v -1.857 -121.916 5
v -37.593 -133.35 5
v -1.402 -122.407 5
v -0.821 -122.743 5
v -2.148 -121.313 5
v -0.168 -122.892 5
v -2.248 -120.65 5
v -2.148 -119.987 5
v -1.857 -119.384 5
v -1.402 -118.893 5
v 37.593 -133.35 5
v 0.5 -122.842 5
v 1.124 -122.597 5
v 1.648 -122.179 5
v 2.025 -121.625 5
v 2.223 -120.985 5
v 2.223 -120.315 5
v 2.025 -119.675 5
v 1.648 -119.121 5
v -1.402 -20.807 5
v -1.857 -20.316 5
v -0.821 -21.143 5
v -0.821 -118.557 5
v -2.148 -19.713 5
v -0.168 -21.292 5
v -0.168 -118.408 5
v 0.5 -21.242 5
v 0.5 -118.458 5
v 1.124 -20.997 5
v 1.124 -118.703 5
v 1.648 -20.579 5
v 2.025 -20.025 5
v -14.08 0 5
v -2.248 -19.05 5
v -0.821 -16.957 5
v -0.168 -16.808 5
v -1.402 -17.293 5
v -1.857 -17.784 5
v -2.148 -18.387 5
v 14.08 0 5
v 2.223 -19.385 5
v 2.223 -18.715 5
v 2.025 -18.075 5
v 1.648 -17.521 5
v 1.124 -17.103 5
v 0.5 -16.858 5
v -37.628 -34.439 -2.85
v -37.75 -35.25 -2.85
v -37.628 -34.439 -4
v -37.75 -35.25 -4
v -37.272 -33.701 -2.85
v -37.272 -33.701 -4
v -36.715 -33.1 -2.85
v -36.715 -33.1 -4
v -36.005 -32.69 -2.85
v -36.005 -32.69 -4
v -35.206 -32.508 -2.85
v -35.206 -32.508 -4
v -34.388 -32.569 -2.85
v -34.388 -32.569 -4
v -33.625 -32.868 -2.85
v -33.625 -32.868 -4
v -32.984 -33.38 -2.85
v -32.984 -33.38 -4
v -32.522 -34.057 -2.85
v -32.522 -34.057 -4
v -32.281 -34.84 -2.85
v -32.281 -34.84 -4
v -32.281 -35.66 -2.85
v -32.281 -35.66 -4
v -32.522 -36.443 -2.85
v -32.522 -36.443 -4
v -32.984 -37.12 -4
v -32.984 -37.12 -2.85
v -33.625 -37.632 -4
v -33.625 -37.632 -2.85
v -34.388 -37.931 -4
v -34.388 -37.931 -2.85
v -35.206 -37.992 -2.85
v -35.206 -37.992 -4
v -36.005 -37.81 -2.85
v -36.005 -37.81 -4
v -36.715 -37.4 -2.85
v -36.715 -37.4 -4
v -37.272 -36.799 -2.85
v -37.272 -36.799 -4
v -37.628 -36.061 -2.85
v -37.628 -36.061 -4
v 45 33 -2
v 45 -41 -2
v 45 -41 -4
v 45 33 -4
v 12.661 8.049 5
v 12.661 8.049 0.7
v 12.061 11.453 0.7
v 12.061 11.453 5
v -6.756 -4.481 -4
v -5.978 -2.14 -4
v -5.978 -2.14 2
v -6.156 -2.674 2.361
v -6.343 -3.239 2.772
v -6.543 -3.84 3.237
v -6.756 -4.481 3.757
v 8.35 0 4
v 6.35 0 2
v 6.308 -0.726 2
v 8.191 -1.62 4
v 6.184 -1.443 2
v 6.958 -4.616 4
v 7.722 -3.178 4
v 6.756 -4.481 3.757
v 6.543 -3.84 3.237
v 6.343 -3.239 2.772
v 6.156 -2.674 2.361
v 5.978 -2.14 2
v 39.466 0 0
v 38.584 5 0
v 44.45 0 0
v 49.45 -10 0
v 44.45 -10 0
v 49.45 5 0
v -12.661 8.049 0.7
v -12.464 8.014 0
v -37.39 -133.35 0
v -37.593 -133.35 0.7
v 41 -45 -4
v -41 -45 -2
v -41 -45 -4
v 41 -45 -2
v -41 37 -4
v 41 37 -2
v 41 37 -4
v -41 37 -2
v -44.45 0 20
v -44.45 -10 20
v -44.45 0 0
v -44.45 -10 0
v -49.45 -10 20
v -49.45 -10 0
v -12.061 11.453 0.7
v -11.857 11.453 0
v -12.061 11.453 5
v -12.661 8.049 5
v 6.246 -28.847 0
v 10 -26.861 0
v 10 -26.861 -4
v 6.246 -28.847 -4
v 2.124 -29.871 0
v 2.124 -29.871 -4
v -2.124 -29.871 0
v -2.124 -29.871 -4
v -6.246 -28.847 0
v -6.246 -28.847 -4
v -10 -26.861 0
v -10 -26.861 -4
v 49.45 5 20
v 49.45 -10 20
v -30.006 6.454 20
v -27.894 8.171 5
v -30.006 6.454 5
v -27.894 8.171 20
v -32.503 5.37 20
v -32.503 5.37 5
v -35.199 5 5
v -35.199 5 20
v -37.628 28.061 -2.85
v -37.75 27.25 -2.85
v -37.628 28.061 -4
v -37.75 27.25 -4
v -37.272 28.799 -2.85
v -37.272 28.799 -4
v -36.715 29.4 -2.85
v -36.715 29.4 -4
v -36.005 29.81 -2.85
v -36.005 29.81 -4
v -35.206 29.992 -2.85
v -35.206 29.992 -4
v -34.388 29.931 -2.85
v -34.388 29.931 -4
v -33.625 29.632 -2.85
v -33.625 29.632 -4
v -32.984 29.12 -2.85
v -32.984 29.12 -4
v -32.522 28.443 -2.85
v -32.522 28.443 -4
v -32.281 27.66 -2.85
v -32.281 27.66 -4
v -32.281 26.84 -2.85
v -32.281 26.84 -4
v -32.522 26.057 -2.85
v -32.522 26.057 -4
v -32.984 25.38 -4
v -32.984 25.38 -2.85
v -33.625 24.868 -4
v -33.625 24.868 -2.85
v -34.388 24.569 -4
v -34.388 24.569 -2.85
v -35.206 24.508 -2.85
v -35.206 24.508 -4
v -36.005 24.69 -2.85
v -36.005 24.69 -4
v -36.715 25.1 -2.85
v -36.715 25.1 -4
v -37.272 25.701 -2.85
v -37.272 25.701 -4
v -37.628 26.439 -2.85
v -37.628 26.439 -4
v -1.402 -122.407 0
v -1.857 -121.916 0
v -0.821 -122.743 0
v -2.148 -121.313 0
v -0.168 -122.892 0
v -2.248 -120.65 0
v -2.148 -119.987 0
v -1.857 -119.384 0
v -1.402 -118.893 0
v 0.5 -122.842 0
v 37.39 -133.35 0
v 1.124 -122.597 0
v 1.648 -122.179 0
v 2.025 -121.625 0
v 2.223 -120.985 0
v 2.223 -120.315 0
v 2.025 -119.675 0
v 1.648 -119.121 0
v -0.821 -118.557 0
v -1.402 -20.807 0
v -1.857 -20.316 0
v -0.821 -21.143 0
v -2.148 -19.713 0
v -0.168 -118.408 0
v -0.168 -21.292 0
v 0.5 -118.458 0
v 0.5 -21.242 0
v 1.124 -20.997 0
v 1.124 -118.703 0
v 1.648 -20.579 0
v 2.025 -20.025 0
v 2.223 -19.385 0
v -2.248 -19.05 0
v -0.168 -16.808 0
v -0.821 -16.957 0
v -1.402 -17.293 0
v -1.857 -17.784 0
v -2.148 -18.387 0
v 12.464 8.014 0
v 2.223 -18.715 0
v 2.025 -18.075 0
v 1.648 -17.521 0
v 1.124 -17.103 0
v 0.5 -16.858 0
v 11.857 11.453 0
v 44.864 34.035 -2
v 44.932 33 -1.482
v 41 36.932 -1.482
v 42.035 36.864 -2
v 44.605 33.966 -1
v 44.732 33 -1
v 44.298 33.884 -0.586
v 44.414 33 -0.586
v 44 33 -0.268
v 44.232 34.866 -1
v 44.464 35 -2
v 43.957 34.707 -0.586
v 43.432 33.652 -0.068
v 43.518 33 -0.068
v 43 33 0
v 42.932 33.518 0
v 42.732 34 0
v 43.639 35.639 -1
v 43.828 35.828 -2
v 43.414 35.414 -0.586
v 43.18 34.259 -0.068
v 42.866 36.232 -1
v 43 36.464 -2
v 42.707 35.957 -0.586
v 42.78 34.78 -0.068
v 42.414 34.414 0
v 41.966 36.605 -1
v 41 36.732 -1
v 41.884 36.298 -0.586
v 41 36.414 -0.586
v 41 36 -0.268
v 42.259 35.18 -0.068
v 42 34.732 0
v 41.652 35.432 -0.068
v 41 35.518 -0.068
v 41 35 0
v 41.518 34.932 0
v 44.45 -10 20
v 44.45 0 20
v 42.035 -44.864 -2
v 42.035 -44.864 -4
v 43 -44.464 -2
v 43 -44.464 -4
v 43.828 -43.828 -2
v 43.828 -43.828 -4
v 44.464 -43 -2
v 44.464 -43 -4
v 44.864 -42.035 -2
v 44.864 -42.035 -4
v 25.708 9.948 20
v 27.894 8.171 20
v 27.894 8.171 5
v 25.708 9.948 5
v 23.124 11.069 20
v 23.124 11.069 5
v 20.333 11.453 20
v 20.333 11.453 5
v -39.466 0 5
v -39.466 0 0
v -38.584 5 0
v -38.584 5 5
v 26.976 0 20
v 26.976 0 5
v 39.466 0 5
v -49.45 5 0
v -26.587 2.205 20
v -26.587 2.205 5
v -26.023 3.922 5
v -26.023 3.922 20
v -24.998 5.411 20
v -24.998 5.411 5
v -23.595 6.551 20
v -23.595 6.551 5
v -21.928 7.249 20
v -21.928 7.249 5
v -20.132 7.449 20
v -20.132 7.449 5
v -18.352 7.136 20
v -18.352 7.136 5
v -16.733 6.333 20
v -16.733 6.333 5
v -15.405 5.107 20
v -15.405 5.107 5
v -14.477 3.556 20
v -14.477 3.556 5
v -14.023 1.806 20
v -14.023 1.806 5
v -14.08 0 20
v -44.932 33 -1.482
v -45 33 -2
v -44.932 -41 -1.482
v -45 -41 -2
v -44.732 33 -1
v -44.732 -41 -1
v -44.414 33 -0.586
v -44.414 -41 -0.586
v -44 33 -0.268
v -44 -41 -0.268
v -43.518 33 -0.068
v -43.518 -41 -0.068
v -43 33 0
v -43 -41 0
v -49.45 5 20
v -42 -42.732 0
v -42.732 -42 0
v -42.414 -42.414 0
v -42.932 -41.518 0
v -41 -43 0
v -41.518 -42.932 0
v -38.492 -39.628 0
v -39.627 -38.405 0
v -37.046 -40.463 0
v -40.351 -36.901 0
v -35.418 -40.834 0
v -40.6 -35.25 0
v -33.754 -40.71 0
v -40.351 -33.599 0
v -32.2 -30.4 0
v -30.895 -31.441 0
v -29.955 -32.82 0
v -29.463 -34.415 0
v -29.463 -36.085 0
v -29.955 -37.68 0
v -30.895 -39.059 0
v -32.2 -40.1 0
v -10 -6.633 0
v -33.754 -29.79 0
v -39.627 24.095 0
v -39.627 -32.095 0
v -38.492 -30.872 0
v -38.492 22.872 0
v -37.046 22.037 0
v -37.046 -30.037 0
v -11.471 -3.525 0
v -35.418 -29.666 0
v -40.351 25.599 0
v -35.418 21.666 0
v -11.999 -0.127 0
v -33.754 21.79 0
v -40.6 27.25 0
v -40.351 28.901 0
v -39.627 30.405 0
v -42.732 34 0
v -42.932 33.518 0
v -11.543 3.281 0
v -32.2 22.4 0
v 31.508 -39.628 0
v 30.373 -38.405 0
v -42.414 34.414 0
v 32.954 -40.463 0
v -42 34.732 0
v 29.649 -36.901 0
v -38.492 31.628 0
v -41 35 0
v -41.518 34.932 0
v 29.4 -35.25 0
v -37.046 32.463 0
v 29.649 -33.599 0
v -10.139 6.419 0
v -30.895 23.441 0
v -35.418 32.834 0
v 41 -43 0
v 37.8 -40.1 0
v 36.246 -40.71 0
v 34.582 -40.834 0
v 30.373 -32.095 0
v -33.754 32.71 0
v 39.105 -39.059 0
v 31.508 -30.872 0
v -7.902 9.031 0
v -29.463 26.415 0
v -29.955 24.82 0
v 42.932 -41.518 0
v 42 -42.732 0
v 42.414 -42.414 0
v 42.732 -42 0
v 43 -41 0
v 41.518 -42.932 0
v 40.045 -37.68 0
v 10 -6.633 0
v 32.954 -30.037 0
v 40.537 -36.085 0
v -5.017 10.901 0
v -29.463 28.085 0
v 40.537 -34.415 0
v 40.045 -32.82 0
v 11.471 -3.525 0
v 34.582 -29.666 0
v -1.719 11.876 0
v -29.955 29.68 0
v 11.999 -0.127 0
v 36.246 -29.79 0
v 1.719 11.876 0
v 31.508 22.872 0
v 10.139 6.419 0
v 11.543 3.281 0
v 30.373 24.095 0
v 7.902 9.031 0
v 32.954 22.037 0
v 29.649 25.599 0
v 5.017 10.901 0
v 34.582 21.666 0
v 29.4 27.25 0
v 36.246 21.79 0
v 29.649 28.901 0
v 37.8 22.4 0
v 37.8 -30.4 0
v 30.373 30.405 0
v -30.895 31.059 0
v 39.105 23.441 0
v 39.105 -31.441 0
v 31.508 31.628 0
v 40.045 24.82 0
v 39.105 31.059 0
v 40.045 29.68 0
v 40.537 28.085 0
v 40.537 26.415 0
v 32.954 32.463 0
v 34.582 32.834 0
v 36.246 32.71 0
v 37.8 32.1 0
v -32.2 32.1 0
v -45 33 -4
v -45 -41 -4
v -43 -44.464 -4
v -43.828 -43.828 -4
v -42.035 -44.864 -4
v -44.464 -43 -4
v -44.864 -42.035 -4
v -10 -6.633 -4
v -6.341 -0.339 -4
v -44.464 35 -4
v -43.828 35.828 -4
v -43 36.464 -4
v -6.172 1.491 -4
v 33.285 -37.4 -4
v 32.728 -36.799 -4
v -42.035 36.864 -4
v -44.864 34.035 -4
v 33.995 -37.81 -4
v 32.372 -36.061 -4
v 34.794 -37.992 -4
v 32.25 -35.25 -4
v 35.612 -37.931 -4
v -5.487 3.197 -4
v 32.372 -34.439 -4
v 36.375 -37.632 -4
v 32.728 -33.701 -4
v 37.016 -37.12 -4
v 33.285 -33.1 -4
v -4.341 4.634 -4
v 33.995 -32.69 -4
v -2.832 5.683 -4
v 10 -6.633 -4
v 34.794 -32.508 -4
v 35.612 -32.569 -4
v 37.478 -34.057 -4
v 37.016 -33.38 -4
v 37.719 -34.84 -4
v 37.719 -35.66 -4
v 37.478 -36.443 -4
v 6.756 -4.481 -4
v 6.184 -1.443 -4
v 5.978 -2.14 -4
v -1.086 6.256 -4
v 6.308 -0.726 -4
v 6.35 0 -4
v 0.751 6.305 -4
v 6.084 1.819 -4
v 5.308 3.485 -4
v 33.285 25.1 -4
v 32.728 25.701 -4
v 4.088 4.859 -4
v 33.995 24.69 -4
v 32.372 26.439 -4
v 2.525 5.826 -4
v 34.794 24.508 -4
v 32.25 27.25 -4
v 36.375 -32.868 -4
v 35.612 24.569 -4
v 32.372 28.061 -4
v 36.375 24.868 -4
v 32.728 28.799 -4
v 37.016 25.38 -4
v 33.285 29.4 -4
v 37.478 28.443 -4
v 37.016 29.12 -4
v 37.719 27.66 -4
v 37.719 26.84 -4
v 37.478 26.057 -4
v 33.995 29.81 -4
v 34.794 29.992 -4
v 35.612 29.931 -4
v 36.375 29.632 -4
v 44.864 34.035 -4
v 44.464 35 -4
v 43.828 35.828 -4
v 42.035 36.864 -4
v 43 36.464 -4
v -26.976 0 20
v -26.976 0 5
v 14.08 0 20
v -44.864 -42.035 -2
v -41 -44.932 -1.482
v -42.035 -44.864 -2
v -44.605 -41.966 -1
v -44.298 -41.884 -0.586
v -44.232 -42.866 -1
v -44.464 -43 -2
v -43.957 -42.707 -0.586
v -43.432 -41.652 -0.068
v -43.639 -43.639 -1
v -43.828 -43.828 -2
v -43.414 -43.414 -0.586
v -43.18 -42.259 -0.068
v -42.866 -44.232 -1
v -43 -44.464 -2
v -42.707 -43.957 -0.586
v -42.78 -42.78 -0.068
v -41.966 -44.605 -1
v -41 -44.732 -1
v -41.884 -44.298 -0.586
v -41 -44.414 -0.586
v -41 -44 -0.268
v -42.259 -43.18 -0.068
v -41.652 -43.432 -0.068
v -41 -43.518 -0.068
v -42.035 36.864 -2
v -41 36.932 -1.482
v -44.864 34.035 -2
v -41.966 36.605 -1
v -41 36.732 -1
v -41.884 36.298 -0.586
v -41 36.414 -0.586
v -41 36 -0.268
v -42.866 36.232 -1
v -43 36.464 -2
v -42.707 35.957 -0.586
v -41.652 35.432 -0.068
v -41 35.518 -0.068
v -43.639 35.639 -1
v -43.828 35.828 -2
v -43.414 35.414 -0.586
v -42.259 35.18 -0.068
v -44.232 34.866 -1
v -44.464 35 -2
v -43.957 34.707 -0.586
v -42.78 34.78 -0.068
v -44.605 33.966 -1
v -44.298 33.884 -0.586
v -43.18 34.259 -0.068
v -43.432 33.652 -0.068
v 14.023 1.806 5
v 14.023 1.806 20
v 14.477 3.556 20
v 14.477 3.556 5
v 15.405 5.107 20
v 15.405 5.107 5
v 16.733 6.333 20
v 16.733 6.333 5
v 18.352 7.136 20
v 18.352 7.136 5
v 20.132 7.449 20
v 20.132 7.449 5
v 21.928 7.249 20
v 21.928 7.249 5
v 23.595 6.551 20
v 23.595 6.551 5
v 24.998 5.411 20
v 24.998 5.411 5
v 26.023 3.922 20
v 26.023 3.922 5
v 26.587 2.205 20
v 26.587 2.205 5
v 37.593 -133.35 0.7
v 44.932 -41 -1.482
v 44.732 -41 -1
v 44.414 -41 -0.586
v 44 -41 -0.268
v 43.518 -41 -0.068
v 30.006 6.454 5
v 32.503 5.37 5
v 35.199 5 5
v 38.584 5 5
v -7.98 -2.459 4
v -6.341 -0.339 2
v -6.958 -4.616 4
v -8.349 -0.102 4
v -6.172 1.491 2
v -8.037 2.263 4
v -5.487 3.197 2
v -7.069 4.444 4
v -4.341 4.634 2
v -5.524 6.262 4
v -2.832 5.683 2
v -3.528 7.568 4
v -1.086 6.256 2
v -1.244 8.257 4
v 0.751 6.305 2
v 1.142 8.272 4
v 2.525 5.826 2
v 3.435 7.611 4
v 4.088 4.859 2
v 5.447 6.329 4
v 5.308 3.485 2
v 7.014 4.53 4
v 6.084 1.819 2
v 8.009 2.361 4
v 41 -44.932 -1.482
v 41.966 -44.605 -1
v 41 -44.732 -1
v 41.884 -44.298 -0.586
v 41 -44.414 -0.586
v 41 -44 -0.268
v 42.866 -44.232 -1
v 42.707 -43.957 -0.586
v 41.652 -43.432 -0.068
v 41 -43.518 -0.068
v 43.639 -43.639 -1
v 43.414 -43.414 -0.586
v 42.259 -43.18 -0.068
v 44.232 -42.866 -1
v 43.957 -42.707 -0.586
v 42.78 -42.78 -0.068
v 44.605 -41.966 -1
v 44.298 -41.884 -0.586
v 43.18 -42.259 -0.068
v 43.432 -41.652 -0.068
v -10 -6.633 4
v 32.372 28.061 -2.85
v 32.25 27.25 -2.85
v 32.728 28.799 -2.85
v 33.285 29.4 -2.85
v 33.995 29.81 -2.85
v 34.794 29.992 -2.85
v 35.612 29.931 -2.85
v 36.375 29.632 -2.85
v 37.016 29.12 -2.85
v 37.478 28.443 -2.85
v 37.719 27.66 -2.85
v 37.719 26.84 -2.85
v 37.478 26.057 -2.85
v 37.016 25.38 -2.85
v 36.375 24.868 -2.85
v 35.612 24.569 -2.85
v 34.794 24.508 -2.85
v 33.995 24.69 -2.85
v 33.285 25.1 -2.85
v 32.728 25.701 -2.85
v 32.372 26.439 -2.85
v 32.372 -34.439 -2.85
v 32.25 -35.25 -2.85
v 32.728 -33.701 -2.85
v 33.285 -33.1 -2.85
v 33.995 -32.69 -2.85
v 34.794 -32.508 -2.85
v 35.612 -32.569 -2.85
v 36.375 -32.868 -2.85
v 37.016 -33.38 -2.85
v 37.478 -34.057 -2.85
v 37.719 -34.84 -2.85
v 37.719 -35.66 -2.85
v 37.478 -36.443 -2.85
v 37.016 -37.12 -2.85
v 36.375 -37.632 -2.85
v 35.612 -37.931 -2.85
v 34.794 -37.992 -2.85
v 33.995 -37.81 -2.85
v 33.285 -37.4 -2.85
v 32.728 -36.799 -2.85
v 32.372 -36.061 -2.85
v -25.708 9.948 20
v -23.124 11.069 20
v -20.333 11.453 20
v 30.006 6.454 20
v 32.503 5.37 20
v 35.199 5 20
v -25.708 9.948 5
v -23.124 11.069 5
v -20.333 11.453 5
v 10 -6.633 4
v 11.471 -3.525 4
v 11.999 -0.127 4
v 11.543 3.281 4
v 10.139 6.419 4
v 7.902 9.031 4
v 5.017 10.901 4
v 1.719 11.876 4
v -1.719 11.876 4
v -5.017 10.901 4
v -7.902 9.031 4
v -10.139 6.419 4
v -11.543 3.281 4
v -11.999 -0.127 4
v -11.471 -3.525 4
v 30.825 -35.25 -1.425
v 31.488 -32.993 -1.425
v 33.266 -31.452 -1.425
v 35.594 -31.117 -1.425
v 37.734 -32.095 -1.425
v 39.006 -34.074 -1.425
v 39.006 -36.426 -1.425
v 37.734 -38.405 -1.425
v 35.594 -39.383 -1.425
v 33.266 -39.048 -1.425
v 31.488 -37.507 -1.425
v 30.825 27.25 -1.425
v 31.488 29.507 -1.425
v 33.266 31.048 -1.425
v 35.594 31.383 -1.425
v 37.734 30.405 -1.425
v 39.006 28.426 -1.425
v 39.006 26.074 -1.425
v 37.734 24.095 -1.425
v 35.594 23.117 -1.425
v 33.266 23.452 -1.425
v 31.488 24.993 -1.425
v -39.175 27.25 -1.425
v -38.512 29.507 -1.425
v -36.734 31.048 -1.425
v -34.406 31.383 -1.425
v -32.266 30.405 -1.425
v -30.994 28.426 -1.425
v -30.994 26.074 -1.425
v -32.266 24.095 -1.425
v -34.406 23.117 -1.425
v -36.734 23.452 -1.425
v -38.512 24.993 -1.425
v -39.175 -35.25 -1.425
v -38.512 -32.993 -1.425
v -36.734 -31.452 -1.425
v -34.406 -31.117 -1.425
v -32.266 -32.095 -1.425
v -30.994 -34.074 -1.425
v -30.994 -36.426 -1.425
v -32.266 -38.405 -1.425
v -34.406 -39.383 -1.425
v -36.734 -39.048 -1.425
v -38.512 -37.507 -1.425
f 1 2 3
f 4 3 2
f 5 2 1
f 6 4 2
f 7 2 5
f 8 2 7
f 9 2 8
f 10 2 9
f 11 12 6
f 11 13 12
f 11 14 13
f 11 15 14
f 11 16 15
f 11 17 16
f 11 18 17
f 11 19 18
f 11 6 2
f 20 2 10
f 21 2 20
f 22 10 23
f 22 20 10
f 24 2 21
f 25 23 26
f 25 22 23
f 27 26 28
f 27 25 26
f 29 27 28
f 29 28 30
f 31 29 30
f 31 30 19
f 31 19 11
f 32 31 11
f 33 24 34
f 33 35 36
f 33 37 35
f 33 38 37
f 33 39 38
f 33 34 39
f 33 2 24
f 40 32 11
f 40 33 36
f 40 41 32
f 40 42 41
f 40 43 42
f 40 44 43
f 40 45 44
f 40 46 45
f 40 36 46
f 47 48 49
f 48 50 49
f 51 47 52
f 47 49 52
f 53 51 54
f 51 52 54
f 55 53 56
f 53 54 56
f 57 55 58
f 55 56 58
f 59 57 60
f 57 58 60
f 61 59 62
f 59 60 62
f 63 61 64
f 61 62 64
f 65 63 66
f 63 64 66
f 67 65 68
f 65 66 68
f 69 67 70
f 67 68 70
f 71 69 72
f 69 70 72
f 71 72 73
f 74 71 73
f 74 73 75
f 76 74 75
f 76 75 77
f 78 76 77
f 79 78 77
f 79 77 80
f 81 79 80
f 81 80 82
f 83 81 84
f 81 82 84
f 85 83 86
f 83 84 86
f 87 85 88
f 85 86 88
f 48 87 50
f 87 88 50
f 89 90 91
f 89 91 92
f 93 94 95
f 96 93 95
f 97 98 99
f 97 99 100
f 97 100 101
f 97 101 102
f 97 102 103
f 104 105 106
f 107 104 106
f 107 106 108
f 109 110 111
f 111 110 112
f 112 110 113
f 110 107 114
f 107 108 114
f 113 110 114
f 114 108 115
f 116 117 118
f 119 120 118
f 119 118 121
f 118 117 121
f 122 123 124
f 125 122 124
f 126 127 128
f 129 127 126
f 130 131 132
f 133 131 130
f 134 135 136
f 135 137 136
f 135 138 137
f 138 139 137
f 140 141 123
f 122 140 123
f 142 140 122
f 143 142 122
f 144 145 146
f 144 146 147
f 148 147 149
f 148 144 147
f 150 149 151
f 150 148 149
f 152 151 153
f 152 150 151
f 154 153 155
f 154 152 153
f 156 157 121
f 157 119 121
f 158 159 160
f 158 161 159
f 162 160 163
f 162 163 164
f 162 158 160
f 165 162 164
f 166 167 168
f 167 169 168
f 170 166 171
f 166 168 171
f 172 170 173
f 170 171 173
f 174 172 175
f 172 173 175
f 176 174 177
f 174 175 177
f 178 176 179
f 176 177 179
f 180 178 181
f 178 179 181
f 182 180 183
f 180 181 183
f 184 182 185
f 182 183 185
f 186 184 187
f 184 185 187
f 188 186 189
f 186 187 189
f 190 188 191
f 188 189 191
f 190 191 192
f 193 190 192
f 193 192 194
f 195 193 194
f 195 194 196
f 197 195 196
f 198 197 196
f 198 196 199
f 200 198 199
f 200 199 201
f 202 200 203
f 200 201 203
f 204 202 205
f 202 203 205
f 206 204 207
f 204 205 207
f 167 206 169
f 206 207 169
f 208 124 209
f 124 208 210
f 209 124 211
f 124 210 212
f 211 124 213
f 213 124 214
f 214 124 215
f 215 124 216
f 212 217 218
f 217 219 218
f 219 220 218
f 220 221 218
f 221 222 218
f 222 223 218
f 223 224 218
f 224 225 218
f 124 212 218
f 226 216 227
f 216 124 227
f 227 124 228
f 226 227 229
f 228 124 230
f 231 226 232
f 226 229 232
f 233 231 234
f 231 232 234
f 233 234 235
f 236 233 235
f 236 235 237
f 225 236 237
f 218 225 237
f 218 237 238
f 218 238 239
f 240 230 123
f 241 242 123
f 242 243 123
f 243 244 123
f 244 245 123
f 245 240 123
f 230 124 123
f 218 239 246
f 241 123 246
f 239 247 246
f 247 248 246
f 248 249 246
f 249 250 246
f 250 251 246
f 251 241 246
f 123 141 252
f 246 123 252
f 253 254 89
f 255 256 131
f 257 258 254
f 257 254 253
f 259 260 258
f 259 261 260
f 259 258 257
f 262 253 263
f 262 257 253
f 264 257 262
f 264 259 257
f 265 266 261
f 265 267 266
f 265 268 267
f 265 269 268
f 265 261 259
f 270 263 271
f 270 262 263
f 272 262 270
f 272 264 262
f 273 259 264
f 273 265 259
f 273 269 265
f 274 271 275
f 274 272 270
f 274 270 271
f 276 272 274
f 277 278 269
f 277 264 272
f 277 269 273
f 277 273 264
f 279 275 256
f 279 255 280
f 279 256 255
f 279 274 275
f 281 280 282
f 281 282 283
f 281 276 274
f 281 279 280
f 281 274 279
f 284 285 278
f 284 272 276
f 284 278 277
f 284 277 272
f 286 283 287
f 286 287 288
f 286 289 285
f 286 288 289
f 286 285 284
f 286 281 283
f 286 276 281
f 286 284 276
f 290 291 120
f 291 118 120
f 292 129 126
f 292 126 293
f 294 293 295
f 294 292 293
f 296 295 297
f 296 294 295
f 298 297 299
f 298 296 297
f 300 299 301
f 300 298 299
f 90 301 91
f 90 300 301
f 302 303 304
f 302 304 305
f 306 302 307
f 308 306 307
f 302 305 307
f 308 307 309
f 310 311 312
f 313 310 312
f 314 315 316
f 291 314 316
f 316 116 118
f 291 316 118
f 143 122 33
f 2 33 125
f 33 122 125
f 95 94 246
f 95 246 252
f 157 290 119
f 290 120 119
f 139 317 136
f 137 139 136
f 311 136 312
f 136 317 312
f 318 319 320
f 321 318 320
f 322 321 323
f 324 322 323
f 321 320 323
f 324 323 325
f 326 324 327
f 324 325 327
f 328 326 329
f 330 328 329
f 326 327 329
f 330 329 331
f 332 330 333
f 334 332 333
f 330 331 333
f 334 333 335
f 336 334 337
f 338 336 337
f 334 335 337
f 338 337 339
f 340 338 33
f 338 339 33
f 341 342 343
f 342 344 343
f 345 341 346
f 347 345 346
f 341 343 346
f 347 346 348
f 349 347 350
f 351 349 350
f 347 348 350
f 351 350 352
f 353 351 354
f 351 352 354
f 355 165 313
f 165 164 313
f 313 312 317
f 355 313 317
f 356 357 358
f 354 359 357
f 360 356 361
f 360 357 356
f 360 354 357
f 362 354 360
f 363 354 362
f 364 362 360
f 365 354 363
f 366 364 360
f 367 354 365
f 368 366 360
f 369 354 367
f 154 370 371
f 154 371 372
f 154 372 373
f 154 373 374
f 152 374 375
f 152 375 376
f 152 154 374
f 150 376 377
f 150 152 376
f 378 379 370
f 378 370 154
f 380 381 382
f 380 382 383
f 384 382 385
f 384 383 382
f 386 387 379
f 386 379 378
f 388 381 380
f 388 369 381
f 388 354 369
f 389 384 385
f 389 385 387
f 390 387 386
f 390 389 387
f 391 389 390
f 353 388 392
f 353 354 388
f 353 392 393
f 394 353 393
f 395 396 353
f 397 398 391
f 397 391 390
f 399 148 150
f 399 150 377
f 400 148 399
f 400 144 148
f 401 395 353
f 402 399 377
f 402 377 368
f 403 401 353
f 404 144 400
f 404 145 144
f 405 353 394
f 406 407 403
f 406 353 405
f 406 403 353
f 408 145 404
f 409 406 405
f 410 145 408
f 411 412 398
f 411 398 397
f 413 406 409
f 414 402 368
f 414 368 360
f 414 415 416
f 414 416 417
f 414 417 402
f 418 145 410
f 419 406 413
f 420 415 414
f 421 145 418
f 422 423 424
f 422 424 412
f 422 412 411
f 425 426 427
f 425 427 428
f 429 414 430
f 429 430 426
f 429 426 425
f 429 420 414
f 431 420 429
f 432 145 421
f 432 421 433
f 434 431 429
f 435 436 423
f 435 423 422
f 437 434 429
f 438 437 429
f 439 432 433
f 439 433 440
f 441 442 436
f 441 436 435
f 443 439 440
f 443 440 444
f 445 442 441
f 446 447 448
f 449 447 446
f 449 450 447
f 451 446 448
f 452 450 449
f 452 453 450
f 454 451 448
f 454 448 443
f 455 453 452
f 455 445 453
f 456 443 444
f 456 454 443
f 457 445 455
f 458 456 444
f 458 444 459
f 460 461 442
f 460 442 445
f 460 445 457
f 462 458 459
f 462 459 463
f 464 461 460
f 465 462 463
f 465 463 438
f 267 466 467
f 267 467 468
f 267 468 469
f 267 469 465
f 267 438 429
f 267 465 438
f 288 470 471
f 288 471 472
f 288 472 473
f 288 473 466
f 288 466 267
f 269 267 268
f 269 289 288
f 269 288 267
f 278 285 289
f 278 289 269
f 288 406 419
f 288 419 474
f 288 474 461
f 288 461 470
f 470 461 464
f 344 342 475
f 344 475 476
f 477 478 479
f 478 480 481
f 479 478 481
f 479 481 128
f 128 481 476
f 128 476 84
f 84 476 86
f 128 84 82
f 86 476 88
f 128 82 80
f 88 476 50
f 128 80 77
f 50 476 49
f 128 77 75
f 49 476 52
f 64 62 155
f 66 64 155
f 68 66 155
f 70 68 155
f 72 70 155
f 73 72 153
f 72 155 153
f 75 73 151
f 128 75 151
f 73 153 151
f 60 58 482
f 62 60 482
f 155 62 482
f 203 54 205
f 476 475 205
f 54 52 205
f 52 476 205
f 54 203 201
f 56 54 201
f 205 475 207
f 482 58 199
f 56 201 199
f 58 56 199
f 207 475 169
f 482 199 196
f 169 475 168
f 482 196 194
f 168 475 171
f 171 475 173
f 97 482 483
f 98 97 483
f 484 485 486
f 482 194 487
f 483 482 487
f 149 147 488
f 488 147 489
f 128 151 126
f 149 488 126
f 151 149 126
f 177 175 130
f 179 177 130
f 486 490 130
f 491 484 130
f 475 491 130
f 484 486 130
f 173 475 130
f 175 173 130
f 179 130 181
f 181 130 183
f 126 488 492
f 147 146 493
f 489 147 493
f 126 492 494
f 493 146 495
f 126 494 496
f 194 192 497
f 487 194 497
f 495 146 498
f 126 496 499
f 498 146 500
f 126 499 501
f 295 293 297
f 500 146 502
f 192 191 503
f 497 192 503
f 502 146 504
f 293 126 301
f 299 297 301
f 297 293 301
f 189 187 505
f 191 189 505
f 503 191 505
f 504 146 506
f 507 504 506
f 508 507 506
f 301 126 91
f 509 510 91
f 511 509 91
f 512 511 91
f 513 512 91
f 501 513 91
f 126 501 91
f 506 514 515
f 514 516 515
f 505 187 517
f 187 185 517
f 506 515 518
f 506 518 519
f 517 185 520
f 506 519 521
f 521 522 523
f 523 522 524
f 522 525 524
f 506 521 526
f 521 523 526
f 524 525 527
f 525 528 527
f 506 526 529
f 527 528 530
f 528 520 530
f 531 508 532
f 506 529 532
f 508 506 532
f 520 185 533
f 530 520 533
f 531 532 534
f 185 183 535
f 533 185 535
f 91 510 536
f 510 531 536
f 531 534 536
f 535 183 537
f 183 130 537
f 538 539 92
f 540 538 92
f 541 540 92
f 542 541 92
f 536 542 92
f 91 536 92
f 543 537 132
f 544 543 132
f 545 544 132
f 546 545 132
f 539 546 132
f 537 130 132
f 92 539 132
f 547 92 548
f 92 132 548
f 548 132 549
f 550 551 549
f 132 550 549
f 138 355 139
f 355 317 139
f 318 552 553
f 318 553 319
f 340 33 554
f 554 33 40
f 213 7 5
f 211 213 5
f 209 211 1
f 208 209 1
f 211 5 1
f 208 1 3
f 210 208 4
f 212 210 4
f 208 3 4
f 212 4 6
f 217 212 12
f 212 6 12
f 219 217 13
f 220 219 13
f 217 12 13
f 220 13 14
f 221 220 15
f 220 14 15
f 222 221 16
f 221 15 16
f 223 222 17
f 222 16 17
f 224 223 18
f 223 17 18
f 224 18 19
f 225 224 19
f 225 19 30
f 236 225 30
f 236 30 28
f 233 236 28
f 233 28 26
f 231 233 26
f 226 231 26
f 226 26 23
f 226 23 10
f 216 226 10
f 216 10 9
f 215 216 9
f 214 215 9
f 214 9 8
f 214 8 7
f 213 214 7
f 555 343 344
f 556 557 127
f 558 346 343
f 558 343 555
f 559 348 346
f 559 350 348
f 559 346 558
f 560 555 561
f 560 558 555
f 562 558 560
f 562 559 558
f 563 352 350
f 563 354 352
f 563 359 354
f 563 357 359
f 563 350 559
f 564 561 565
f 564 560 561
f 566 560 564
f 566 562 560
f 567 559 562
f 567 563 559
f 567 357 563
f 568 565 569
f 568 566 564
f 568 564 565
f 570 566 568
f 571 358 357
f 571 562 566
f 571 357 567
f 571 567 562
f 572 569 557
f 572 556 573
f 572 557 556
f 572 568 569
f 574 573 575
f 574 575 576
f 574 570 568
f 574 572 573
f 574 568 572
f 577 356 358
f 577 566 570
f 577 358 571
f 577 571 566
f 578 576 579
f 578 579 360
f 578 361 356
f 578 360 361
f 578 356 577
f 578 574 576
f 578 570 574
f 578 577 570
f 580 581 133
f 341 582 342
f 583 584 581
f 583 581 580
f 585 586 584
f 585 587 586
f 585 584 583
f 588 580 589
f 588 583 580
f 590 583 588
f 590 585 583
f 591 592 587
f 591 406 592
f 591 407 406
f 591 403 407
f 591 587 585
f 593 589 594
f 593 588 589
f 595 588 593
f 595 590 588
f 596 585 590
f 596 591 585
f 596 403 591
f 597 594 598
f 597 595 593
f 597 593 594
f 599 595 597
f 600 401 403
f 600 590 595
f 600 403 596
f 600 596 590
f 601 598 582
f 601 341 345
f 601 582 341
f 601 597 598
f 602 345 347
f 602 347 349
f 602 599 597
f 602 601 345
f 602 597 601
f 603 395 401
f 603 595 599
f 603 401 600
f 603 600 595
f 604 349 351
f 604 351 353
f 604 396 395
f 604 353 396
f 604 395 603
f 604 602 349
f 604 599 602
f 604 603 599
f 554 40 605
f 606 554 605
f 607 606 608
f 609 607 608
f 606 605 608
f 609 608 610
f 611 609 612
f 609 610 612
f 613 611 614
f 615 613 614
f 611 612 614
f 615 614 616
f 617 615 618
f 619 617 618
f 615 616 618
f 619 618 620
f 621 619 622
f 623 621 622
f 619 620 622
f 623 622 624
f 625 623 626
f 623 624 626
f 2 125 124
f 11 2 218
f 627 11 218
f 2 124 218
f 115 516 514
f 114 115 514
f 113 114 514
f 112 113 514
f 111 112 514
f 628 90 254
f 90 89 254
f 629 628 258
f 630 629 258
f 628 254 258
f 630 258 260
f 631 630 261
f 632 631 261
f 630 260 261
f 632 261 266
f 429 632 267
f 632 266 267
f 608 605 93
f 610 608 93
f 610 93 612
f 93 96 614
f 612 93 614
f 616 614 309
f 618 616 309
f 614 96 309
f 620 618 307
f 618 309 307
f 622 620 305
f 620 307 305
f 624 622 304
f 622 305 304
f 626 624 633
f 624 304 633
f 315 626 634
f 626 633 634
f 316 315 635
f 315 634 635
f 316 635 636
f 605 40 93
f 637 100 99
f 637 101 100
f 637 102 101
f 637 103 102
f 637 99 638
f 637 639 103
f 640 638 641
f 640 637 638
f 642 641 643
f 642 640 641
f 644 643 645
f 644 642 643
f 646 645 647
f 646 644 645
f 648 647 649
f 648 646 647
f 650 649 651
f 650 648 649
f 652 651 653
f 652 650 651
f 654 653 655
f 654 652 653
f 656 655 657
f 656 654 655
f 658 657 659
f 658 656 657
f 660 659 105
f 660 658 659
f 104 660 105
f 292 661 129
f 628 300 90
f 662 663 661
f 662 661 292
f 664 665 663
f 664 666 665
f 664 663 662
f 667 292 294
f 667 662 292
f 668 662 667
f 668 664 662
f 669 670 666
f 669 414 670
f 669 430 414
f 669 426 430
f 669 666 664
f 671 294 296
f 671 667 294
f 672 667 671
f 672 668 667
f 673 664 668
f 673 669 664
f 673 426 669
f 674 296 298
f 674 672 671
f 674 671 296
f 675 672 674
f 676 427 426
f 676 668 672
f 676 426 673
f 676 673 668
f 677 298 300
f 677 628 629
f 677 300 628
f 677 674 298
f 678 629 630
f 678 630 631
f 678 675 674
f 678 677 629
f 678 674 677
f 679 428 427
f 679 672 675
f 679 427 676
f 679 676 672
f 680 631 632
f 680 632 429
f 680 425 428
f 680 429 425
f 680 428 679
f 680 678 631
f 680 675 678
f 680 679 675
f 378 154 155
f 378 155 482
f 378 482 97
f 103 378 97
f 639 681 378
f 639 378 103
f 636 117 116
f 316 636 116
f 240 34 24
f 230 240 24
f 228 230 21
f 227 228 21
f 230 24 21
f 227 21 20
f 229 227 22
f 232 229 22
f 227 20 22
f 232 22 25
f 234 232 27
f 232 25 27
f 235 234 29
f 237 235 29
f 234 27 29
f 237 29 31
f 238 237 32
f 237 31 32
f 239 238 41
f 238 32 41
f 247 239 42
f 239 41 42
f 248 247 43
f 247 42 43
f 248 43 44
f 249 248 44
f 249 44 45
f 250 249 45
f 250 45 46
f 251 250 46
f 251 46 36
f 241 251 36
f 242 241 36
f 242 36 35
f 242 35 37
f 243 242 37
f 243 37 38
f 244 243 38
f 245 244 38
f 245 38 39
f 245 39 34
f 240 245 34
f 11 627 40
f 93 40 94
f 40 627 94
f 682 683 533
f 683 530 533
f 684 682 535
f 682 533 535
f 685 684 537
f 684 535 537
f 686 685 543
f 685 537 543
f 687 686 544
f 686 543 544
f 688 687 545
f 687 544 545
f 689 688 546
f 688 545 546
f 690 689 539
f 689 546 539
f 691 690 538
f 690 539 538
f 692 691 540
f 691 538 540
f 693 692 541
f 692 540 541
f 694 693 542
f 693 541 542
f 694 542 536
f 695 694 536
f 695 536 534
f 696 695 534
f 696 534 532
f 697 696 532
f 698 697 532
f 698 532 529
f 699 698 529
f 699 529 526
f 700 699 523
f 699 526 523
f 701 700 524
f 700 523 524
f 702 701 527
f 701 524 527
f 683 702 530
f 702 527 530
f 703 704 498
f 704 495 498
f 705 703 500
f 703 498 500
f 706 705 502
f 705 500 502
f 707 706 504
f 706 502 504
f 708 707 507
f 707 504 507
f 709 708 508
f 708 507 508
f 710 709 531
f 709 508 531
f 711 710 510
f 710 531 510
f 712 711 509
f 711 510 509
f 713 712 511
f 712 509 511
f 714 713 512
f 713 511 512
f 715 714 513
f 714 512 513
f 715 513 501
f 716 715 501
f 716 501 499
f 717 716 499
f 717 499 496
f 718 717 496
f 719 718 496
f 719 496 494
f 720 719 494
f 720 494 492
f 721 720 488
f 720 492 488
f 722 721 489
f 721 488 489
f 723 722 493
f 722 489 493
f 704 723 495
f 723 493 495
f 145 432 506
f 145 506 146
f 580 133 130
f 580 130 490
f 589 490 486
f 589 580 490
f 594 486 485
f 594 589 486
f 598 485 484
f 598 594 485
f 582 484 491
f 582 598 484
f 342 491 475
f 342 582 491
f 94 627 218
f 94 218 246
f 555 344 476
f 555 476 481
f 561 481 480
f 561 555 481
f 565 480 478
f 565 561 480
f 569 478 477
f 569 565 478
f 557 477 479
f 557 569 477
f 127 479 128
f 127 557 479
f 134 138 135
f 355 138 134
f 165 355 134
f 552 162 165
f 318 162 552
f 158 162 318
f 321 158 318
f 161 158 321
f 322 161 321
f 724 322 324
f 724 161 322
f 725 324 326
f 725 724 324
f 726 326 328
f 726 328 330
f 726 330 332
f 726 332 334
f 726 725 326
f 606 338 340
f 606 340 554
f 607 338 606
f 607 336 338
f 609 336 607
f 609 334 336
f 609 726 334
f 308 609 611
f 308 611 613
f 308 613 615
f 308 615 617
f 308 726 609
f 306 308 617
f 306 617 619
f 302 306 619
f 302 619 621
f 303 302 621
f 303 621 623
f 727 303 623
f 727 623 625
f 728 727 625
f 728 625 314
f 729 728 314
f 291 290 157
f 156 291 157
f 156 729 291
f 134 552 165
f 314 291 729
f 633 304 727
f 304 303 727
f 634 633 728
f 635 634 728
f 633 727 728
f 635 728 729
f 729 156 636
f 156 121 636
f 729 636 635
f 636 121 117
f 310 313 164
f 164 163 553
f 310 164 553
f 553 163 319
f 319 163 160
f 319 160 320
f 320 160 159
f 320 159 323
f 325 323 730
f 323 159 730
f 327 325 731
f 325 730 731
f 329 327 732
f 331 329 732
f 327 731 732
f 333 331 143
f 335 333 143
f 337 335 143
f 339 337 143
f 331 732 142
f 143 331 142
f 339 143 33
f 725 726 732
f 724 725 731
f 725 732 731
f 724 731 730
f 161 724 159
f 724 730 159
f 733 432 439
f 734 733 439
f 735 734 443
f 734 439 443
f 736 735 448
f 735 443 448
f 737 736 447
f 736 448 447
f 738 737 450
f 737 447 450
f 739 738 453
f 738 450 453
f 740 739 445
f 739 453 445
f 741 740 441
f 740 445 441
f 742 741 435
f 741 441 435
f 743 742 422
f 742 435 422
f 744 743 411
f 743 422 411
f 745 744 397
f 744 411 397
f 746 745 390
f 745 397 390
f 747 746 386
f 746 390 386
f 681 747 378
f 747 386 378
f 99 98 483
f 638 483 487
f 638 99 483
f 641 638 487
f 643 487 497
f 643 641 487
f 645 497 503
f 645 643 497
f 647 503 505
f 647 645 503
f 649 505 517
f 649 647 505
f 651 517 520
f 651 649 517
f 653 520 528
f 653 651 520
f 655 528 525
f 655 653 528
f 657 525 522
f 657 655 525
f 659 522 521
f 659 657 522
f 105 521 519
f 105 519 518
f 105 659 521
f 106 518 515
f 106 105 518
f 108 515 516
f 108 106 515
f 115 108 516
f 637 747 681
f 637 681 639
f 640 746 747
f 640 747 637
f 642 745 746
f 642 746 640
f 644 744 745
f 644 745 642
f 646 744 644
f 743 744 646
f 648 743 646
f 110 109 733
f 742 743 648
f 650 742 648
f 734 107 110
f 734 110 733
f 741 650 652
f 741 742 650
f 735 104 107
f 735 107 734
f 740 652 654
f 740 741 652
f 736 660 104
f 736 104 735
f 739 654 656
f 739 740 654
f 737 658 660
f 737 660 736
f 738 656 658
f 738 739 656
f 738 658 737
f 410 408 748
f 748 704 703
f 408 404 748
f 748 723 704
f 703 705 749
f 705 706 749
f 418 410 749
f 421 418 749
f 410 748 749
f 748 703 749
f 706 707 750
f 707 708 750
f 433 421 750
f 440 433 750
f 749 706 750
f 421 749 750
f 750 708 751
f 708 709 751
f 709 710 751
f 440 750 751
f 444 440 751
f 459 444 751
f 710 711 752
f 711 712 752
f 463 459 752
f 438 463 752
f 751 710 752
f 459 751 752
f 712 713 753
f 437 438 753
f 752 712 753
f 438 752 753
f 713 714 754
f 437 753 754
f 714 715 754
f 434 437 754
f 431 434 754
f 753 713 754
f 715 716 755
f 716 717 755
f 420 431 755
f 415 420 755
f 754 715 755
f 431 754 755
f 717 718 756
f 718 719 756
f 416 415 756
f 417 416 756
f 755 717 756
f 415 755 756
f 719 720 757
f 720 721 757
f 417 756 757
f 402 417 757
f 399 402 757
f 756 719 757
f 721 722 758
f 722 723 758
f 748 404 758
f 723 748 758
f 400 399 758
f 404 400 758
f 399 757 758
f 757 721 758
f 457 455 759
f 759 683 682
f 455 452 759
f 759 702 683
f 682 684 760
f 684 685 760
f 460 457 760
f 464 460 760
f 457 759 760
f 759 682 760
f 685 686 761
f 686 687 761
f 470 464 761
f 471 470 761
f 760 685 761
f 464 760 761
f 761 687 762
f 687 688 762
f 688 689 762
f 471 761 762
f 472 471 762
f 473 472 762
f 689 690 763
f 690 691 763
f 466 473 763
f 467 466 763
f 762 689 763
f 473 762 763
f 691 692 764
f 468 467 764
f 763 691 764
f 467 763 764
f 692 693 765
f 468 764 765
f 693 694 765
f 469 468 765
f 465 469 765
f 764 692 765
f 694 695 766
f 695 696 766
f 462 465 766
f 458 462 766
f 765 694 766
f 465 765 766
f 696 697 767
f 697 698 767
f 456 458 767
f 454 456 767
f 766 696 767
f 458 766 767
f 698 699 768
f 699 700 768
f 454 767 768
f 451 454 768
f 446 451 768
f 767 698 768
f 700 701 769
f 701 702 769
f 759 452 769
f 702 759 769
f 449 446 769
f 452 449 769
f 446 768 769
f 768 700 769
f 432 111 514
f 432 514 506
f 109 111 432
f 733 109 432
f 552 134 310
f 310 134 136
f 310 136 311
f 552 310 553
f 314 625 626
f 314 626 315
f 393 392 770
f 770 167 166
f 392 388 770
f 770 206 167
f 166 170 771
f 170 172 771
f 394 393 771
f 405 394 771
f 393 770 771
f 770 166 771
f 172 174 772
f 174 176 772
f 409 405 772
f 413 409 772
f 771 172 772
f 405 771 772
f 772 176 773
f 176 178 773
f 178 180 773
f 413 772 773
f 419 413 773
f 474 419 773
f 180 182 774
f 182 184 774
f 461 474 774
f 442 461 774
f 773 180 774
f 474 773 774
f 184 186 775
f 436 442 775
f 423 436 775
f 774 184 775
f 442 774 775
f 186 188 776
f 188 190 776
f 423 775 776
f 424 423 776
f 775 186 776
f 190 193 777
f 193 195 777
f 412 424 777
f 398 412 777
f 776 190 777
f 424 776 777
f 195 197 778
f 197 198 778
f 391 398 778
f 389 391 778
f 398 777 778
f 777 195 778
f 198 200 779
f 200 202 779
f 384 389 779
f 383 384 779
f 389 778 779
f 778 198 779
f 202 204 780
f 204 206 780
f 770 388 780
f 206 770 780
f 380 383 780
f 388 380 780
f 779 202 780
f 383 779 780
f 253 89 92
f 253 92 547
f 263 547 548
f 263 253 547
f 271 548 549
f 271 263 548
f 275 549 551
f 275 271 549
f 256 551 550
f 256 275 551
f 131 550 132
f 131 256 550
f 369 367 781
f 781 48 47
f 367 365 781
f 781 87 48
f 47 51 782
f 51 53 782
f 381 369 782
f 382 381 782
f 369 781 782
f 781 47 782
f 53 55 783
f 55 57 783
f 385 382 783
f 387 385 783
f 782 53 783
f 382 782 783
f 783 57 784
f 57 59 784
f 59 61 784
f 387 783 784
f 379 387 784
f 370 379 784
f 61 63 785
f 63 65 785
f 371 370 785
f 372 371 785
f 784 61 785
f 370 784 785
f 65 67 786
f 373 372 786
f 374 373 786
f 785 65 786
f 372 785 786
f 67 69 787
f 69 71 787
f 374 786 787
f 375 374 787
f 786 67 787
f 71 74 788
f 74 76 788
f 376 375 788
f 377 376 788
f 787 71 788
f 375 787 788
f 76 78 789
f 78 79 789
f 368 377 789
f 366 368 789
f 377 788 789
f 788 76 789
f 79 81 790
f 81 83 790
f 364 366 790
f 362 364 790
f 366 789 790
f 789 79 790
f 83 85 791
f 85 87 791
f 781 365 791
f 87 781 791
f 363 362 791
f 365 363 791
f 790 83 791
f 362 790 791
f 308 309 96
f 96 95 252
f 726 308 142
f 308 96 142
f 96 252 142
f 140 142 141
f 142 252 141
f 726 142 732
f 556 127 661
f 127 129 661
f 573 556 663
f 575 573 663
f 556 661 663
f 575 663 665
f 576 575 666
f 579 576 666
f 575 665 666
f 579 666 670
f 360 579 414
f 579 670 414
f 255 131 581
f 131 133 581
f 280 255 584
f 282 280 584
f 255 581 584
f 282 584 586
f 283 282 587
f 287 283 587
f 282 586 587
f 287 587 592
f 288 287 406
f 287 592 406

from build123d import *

# Parameters (mm, degrees)
F1_DEPTH       = 4
F2_DEPTH       = 4
F3_T1_DEPTH    = 17.102949117
F3_T3_DEPTH    = 8.5514745585
F3_T5_DEPTH    = 8.5514745585
F3_T8_ANGLE    = 260.0707852325
F3_T10_ANGLE   = 79.9682730154
F4_D           = 5.5
F4_DEPTH       = 8
F4_CSINK_D     = 11.2
F4_CSINK_ANGLE = 90
F4_TIP         = 1.6523667023
F5_R           = 2
F7_DEPTH       = 5
F8_START       = 5
F8_DEPTH       = 15
F9_DEPTH       = 5
F10_D          = 4.4958
F10_DEPTH      = 8
F10_TIP        = 1.3506745855
F11_C1_SIZE2   = 0.2
F11_C1_SIZE    = 0.7
F11_C2_SIZE2   = 0.7
F11_C2_SIZE    = 0.2
F12_R          = 10


# Not quite as in the source:
# - a fillet or chamfer that OpenCascade refuses, or shapes differently, is made with other operations: its cross-section is extruded or revolved along the edge and cut away or added
# - a feature names something its author has since deleted; it is built from what else it names


with BuildPart() as f1:
    # F0 (on Top) → F1 (new body)
    with BuildSketch(Plane.XY):
        with BuildLine():
            Line((-41, -45), (41, -45))
            ThreePointArc((41, -45), (43.8284271247, -43.8284271247), (45, -41))
            Line((45, -41), (45, 33))
            ThreePointArc((45, 33), (43.8284271247, 35.8284271247), (41, 37))
            Line((41, 37), (-41, 37))
            ThreePointArc((-41, 37), (-43.8284271247, 35.8284271247), (-45, 33))
            Line((-45, 33), (-45, -41))
            ThreePointArc((-45, -41), (-43.8284271247, -43.8284271247), (-41, -45))
        make_face()
        with BuildLine():
            Line((-10, -26.8614066163), (-10, -6.6332495807))
            ThreePointArc((-10, -6.6332495807), (0, 12), (10, -6.6332495807))
            Line((10, -6.6332495807), (10, -26.8614066163))
            ThreePointArc((10, -26.8614066163), (0, -30), (-10, -26.8614066163))
        make_face(mode=Mode.SUBTRACT)
        with BuildLine():
            ThreePointArc((-5.2916666667, -3.5100945698), (-1.8330871047, 6.0796621343), (6.35, 0))
            ThreePointArc((6.35, 0), (6.0796621343, -1.8330871047), (5.2916666667, -3.5100945698))
            Line((5.2916666667, -3.5100945698), (10, -6.6332495807))
            ThreePointArc((10, -6.6332495807), (0, 12), (-10, -6.6332495807))
            Line((-10, -6.6332495807), (-5.2916666667, -3.5100945698))
        make_face()
    extrude(amount=-F1_DEPTH)

    # F0 (on Top) → F2 (join)
    with BuildSketch(Plane.XY):
        with BuildLine():
            ThreePointArc((-5.2916666667, -3.5100945698), (-1.8330871047, 6.0796621343), (6.35, 0))
            ThreePointArc((6.35, 0), (6.0796621343, -1.8330871047), (5.2916666667, -3.5100945698))
            Line((5.2916666667, -3.5100945698), (10, -6.6332495807))
            ThreePointArc((10, -6.6332495807), (0, 12), (-10, -6.6332495807))
            Line((-10, -6.6332495807), (-5.2916666667, -3.5100945698))
        make_face()
    extrude(amount=F2_DEPTH)

    # F3: chamfer of 2 on 5 edges, made by hand

    # F3_s2 → F3_t1 (cut)
    with BuildSketch(Plane.XY.offset(-8.5514745585)):
        with BuildLine():
            Line((-5.9783737827, -2.1404548382), (-6.7557845584, -4.481280509))
            Line((-6.7557845584, -4.481280509), (-5.2916666667, -3.5100945698))
            ThreePointArc((-5.2916666667, -3.5100945698), (-5.6892505447, -2.8204482338), (-5.9783737827, -2.1404548382))
        make_face()
    extrude(amount=F3_T1_DEPTH, mode=Mode.SUBTRACT)

    # F3_s4 → F3_t3 (cut)
    with BuildSketch(Plane.XY.offset(-8.5514745585)):
        with BuildLine():
            Line((5.9783737827, -2.1404548382), (6.7557845584, -4.481280509))
            Line((6.7557845584, -4.481280509), (5.2916666667, -3.5100945698))
            ThreePointArc((5.2916666667, -3.5100945698), (5.6892505447, -2.8204482338), (5.9783737827, -2.1404548382))
        make_face()
    extrude(amount=F3_T3_DEPTH, mode=Mode.SUBTRACT)

    # F3_s6 → F3_t5 (cut)
    with BuildSketch(Plane.XY):
        with BuildLine():
            Line((5.9783737827, -2.1404548382), (6.7557845584, -4.481280509))
            Line((6.7557845584, -4.481280509), (5.2916666667, -3.5100945698))
            ThreePointArc((5.2916666667, -3.5100945698), (5.6892505447, -2.8204482338), (5.9783737827, -2.1404548382))
        make_face()
    extrude(amount=F3_T5_DEPTH, mode=Mode.SUBTRACT)

    # F3_s7 → F3_t8 (revolve, cut)
    with BuildSketch(Plane(origin=(0, 0, 0), x_dir=(0, 0, 1), z_dir=(0.9850215325, -0.1724313791, 0))):
        Polygon((2, 6.35), (4, 8.35), (4, 6.35), align=None)
    revolve(axis=Axis((0, 0, 4), (0, 0, -1)), revolution_arc=F3_T8_ANGLE, mode=Mode.SUBTRACT)

    # F3_s9 → F3_t10 (revolve, cut)
    with BuildSketch(Plane.XZ):
        Polygon((8.35, 4), (6.35, 2), (6.35, 4), align=None)
    revolve(axis=Axis((0, 0, 4), (0, 0, -1)), revolution_arc=F3_T10_ANGLE, mode=Mode.SUBTRACT)

    # F4
    with Locations(Plane.XY):
        with Locations((-35, 27.25), (-35, -35.25), (35, -35.25), (35, 27.25)):
            CounterSinkHole(F4_D / 2, F4_CSINK_D / 2, depth=F4_DEPTH, counter_sink_angle=F4_CSINK_ANGLE)
            with Locations((0, 0, -(F4_DEPTH + F4_TIP / 2))):  # 118° drill point
                Cone(0, F4_D / 2, F4_TIP, mode=Mode.SUBTRACT)

    # F5
    f5_edges = [f1.edges().sort_by_distance(p)[0] for p in [
        (0, -45, 0),
        (-43.828427, -43.828427, 0),
        (43.828427, -43.828427, 0),
        (-43.828427, 35.828427, 0),
        (43.828427, 35.828427, 0),
        (0, 37, 0),
    ]]
    fillet(f5_edges, radius=F5_R)

    # F6 (on Top) → F9 (cut)
    with BuildSketch(Plane.XY):
        with BuildLine():
            Line((12.6607118812, 8.0489585372), (14.0799604379, 0))
            ThreePointArc((14.0799604379, 0), (19.2308237413, 7.3561951598), (26.5870189011, 2.2053318564))
            Line((26.5870189011, 2.2053318564), (26.9758784088, 0))
            Line((26.9758784088, 0), (39.4656266949, 0))
            Line((39.4656266949, 0), (38.5839917914, 5))
            Line((38.5839917914, 5), (29.9216744368, 5))
            ThreePointArc((29.9216744368, 5), (26.1121180689, 9.6892807339), (20.3334896695, 11.4526659282))
            ThreePointArc((20.3334896695, 11.4526659282), (16.1365639198, 10.5635493041), (12.6607118812, 8.0489585372))
        make_face()
        with BuildLine():
            ThreePointArc((-26.5870189011, 2.2053318564), (-19.2308237413, 7.3561951598), (-14.0799604379, 0))
            Line((-14.0799604379, 0), (-12.6607118812, 8.0489585372))
            ThreePointArc((-12.6607118812, 8.0489585372), (-16.1365639198, 10.5635493041), (-20.3334896695, 11.4526659282))
            ThreePointArc((-20.3334896695, 11.4526659282), (-26.1121180689, 9.6892807339), (-29.9216744368, 5))
            Line((-29.9216744368, 5), (-38.5839908315, 5))
            Line((-38.5839908315, 5), (-39.465625735, 0))
            Line((-39.465625735, 0), (-26.9758784088, 0))
            Line((-26.9758784088, 0), (-26.5870189011, 2.2053318564))
        make_face()
    extrude(amount=F9_DEPTH, mode=Mode.SUBTRACT)


with BuildPart() as f7:
    # F6 (on Top) → F7 (new body)
    with BuildSketch(Plane.XY):
        Polygon((-14.0799604379, 0), (-37.5931633153, -133.35), (37.5931633153, -133.35), (14.0799604379, 0), align=None)
        with BuildLine():
            Line((-12.6607118812, 8.0489585372), (-14.0799604379, 0))
            Line((-14.0799604379, 0), (14.0799604379, 0))
            Line((14.0799604379, 0), (12.6607118812, 8.0489585372))
            ThreePointArc((12.6607118812, 8.0489585372), (11.5694013468, 6.6084134589), (10.7453049022, 5))
            Line((10.7453049022, 5), (-10.7453049022, 5))
            ThreePointArc((-10.7453049022, 5), (-11.5694013468, 6.6084134589), (-12.6607118812, 8.0489585372))
        make_face()
        with BuildLine():
            Line((-12.0605464337, 11.4526659282), (-12.6607118812, 8.0489585372))
            ThreePointArc((-12.6607118812, 8.0489585372), (-11.5694013468, 6.6084134589), (-10.7453049022, 5))
            Line((-10.7453049022, 5), (10.7453049022, 5))
            ThreePointArc((10.7453049022, 5), (11.5694013468, 6.6084134589), (12.6607118812, 8.0489585372))
            Line((12.6607118812, 8.0489585372), (12.0605464337, 11.4526659282))
            Line((12.0605464337, 11.4526659282), (-12.0605464337, 11.4526659282))
        make_face()
    extrude(amount=F7_DEPTH)



with BuildPart() as f7b:
    # F6 (on Top) → F7, piece 2 (new body)
    with BuildSketch(Plane.XY):
        Polygon((38.5839917914, 5), (39.4656266949, 0), (44.45, 0), (44.45, -10), (49.45, -10), (49.45, 5), align=None)
    extrude(amount=F7_DEPTH)


with BuildPart() as f7c:
    # F6 (on Top) → F7, piece 3 (new body)
    with BuildSketch(Plane.XY):
        Polygon((-44.45, 0), (-39.465625735, 0), (-38.5839908315, 5), (-49.45, 5), (-49.45, -10), (-44.45, -10), align=None)
    extrude(amount=F7_DEPTH)


with BuildPart() as f7_1:
    add(f7.part)

    add(f7b.part)  # F8 merges F7b

    add(f7c.part)  # F8 merges F7c
    # F6 (on Top) → F8 (join)
    with BuildSketch(Plane.XY.offset(F8_START)):
        with BuildLine():
            Line((12.6607118812, 8.0489585372), (14.0799604379, 0))
            ThreePointArc((14.0799604379, 0), (19.2308237413, 7.3561951598), (26.5870189011, 2.2053318564))
            Line((26.5870189011, 2.2053318564), (26.9758784088, 0))
            Line((26.9758784088, 0), (39.4656266949, 0))
            Line((39.4656266949, 0), (38.5839917914, 5))
            Line((38.5839917914, 5), (29.9216744368, 5))
            ThreePointArc((29.9216744368, 5), (26.1121180689, 9.6892807339), (20.3334896695, 11.4526659282))
            ThreePointArc((20.3334896695, 11.4526659282), (16.1365639198, 10.5635493041), (12.6607118812, 8.0489585372))
        make_face()
        Polygon((38.5839917914, 5), (39.4656266949, 0), (44.45, 0), (44.45, -10), (49.45, -10), (49.45, 5), align=None)
        with BuildLine():
            ThreePointArc((-26.5870189011, 2.2053318564), (-19.2308237413, 7.3561951598), (-14.0799604379, 0))
            Line((-14.0799604379, 0), (-12.6607118812, 8.0489585372))
            ThreePointArc((-12.6607118812, 8.0489585372), (-16.1365639198, 10.5635493041), (-20.3334896695, 11.4526659282))
            ThreePointArc((-20.3334896695, 11.4526659282), (-26.1121180689, 9.6892807339), (-29.9216744368, 5))
            Line((-29.9216744368, 5), (-38.5839908315, 5))
            Line((-38.5839908315, 5), (-39.465625735, 0))
            Line((-39.465625735, 0), (-26.9758784088, 0))
            Line((-26.9758784088, 0), (-26.5870189011, 2.2053318564))
        make_face()
        Polygon((-44.45, 0), (-39.465625735, 0), (-38.5839908315, 5), (-49.45, 5), (-49.45, -10), (-44.45, -10), align=None)
        with BuildLine():
            Line((-12.6607118812, 8.0489585372), (-14.0799604379, 0))
            Line((-14.0799604379, 0), (14.0799604379, 0))
            Line((14.0799604379, 0), (12.6607118812, 8.0489585372))
            ThreePointArc((12.6607118812, 8.0489585372), (11.5694013468, 6.6084134589), (10.7453049022, 5))
            Line((10.7453049022, 5), (-10.7453049022, 5))
            ThreePointArc((-10.7453049022, 5), (-11.5694013468, 6.6084134589), (-12.6607118812, 8.0489585372))
        make_face()
        with BuildLine():
            Line((-12.0605464337, 11.4526659282), (-12.6607118812, 8.0489585372))
            ThreePointArc((-12.6607118812, 8.0489585372), (-11.5694013468, 6.6084134589), (-10.7453049022, 5))
            Line((-10.7453049022, 5), (10.7453049022, 5))
            ThreePointArc((10.7453049022, 5), (11.5694013468, 6.6084134589), (12.6607118812, 8.0489585372))
            Line((12.6607118812, 8.0489585372), (12.0605464337, 11.4526659282))
            Line((12.0605464337, 11.4526659282), (-12.0605464337, 11.4526659282))
        make_face()
        with BuildLine():
            Line((12.0605464337, 11.4526659282), (12.6607118812, 8.0489585372))
            ThreePointArc((12.6607118812, 8.0489585372), (16.1365639198, 10.5635493041), (20.3334896695, 11.4526659282))
            Line((20.3334896695, 11.4526659282), (12.0605464337, 11.4526659282))
        make_face()
        with BuildLine():
            ThreePointArc((-20.3334896695, 11.4526659282), (-16.1365639198, 10.5635493041), (-12.6607118812, 8.0489585372))
            Line((-12.6607118812, 8.0489585372), (-12.0605464337, 11.4526659282))
            Line((-12.0605464337, 11.4526659282), (-20.3334896695, 11.4526659282))
        make_face()
    extrude(amount=F8_DEPTH)

    # F10
    with Locations(Plane(origin=(0, 0, 0), x_dir=(1, 0, 0), z_dir=(0, 0, -1))):
        with Locations((0, 19.05), (0, 120.65)):
            Hole(F10_D / 2, depth=F10_DEPTH)
            with Locations((0, 0, -(F10_DEPTH + F10_TIP / 2))):  # 118° drill point
                Cone(0, F10_D / 2, F10_TIP, mode=Mode.SUBTRACT)

    # F11: chamfer of 0.2 x 0.7 on 2 edges, made by hand

    # F11_c1
    f11_c1_edges = [f7_1.edges().sort_by_distance(p)[0] for p in [
        (-24.8268548745, -60.9486670359, 0),
    ]]
    f11_c1_side = f7_1.faces().sort_by_distance((-24.8268548745, -60.9486670359, 0.004))[0]
    chamfer(f11_c1_edges, length=F11_C1_SIZE, length2=F11_C1_SIZE2, reference=f11_c1_side)

    # F11_c2
    f11_c2_edges = [f7_1.edges().sort_by_distance(p)[0] for p in [
        (24.8268548745, -60.9486670359, 0),
    ]]
    f11_c2_side = f7_1.faces().sort_by_distance((24.8229156435, -60.9493616286, 0))[0]
    chamfer(f11_c2_edges, length=F11_C2_SIZE, length2=F11_C2_SIZE2, reference=f11_c2_side)

    # F12
    f12_edges = [f7_1.edges().sort_by_distance(p)[0] for p in [
        (29.921674, 5, 12.5),
        (-29.921674, 5, 12.5),
    ]]
    fillet(f12_edges, radius=F12_R)


solid = Compound([f1.part, f7_1.part])
